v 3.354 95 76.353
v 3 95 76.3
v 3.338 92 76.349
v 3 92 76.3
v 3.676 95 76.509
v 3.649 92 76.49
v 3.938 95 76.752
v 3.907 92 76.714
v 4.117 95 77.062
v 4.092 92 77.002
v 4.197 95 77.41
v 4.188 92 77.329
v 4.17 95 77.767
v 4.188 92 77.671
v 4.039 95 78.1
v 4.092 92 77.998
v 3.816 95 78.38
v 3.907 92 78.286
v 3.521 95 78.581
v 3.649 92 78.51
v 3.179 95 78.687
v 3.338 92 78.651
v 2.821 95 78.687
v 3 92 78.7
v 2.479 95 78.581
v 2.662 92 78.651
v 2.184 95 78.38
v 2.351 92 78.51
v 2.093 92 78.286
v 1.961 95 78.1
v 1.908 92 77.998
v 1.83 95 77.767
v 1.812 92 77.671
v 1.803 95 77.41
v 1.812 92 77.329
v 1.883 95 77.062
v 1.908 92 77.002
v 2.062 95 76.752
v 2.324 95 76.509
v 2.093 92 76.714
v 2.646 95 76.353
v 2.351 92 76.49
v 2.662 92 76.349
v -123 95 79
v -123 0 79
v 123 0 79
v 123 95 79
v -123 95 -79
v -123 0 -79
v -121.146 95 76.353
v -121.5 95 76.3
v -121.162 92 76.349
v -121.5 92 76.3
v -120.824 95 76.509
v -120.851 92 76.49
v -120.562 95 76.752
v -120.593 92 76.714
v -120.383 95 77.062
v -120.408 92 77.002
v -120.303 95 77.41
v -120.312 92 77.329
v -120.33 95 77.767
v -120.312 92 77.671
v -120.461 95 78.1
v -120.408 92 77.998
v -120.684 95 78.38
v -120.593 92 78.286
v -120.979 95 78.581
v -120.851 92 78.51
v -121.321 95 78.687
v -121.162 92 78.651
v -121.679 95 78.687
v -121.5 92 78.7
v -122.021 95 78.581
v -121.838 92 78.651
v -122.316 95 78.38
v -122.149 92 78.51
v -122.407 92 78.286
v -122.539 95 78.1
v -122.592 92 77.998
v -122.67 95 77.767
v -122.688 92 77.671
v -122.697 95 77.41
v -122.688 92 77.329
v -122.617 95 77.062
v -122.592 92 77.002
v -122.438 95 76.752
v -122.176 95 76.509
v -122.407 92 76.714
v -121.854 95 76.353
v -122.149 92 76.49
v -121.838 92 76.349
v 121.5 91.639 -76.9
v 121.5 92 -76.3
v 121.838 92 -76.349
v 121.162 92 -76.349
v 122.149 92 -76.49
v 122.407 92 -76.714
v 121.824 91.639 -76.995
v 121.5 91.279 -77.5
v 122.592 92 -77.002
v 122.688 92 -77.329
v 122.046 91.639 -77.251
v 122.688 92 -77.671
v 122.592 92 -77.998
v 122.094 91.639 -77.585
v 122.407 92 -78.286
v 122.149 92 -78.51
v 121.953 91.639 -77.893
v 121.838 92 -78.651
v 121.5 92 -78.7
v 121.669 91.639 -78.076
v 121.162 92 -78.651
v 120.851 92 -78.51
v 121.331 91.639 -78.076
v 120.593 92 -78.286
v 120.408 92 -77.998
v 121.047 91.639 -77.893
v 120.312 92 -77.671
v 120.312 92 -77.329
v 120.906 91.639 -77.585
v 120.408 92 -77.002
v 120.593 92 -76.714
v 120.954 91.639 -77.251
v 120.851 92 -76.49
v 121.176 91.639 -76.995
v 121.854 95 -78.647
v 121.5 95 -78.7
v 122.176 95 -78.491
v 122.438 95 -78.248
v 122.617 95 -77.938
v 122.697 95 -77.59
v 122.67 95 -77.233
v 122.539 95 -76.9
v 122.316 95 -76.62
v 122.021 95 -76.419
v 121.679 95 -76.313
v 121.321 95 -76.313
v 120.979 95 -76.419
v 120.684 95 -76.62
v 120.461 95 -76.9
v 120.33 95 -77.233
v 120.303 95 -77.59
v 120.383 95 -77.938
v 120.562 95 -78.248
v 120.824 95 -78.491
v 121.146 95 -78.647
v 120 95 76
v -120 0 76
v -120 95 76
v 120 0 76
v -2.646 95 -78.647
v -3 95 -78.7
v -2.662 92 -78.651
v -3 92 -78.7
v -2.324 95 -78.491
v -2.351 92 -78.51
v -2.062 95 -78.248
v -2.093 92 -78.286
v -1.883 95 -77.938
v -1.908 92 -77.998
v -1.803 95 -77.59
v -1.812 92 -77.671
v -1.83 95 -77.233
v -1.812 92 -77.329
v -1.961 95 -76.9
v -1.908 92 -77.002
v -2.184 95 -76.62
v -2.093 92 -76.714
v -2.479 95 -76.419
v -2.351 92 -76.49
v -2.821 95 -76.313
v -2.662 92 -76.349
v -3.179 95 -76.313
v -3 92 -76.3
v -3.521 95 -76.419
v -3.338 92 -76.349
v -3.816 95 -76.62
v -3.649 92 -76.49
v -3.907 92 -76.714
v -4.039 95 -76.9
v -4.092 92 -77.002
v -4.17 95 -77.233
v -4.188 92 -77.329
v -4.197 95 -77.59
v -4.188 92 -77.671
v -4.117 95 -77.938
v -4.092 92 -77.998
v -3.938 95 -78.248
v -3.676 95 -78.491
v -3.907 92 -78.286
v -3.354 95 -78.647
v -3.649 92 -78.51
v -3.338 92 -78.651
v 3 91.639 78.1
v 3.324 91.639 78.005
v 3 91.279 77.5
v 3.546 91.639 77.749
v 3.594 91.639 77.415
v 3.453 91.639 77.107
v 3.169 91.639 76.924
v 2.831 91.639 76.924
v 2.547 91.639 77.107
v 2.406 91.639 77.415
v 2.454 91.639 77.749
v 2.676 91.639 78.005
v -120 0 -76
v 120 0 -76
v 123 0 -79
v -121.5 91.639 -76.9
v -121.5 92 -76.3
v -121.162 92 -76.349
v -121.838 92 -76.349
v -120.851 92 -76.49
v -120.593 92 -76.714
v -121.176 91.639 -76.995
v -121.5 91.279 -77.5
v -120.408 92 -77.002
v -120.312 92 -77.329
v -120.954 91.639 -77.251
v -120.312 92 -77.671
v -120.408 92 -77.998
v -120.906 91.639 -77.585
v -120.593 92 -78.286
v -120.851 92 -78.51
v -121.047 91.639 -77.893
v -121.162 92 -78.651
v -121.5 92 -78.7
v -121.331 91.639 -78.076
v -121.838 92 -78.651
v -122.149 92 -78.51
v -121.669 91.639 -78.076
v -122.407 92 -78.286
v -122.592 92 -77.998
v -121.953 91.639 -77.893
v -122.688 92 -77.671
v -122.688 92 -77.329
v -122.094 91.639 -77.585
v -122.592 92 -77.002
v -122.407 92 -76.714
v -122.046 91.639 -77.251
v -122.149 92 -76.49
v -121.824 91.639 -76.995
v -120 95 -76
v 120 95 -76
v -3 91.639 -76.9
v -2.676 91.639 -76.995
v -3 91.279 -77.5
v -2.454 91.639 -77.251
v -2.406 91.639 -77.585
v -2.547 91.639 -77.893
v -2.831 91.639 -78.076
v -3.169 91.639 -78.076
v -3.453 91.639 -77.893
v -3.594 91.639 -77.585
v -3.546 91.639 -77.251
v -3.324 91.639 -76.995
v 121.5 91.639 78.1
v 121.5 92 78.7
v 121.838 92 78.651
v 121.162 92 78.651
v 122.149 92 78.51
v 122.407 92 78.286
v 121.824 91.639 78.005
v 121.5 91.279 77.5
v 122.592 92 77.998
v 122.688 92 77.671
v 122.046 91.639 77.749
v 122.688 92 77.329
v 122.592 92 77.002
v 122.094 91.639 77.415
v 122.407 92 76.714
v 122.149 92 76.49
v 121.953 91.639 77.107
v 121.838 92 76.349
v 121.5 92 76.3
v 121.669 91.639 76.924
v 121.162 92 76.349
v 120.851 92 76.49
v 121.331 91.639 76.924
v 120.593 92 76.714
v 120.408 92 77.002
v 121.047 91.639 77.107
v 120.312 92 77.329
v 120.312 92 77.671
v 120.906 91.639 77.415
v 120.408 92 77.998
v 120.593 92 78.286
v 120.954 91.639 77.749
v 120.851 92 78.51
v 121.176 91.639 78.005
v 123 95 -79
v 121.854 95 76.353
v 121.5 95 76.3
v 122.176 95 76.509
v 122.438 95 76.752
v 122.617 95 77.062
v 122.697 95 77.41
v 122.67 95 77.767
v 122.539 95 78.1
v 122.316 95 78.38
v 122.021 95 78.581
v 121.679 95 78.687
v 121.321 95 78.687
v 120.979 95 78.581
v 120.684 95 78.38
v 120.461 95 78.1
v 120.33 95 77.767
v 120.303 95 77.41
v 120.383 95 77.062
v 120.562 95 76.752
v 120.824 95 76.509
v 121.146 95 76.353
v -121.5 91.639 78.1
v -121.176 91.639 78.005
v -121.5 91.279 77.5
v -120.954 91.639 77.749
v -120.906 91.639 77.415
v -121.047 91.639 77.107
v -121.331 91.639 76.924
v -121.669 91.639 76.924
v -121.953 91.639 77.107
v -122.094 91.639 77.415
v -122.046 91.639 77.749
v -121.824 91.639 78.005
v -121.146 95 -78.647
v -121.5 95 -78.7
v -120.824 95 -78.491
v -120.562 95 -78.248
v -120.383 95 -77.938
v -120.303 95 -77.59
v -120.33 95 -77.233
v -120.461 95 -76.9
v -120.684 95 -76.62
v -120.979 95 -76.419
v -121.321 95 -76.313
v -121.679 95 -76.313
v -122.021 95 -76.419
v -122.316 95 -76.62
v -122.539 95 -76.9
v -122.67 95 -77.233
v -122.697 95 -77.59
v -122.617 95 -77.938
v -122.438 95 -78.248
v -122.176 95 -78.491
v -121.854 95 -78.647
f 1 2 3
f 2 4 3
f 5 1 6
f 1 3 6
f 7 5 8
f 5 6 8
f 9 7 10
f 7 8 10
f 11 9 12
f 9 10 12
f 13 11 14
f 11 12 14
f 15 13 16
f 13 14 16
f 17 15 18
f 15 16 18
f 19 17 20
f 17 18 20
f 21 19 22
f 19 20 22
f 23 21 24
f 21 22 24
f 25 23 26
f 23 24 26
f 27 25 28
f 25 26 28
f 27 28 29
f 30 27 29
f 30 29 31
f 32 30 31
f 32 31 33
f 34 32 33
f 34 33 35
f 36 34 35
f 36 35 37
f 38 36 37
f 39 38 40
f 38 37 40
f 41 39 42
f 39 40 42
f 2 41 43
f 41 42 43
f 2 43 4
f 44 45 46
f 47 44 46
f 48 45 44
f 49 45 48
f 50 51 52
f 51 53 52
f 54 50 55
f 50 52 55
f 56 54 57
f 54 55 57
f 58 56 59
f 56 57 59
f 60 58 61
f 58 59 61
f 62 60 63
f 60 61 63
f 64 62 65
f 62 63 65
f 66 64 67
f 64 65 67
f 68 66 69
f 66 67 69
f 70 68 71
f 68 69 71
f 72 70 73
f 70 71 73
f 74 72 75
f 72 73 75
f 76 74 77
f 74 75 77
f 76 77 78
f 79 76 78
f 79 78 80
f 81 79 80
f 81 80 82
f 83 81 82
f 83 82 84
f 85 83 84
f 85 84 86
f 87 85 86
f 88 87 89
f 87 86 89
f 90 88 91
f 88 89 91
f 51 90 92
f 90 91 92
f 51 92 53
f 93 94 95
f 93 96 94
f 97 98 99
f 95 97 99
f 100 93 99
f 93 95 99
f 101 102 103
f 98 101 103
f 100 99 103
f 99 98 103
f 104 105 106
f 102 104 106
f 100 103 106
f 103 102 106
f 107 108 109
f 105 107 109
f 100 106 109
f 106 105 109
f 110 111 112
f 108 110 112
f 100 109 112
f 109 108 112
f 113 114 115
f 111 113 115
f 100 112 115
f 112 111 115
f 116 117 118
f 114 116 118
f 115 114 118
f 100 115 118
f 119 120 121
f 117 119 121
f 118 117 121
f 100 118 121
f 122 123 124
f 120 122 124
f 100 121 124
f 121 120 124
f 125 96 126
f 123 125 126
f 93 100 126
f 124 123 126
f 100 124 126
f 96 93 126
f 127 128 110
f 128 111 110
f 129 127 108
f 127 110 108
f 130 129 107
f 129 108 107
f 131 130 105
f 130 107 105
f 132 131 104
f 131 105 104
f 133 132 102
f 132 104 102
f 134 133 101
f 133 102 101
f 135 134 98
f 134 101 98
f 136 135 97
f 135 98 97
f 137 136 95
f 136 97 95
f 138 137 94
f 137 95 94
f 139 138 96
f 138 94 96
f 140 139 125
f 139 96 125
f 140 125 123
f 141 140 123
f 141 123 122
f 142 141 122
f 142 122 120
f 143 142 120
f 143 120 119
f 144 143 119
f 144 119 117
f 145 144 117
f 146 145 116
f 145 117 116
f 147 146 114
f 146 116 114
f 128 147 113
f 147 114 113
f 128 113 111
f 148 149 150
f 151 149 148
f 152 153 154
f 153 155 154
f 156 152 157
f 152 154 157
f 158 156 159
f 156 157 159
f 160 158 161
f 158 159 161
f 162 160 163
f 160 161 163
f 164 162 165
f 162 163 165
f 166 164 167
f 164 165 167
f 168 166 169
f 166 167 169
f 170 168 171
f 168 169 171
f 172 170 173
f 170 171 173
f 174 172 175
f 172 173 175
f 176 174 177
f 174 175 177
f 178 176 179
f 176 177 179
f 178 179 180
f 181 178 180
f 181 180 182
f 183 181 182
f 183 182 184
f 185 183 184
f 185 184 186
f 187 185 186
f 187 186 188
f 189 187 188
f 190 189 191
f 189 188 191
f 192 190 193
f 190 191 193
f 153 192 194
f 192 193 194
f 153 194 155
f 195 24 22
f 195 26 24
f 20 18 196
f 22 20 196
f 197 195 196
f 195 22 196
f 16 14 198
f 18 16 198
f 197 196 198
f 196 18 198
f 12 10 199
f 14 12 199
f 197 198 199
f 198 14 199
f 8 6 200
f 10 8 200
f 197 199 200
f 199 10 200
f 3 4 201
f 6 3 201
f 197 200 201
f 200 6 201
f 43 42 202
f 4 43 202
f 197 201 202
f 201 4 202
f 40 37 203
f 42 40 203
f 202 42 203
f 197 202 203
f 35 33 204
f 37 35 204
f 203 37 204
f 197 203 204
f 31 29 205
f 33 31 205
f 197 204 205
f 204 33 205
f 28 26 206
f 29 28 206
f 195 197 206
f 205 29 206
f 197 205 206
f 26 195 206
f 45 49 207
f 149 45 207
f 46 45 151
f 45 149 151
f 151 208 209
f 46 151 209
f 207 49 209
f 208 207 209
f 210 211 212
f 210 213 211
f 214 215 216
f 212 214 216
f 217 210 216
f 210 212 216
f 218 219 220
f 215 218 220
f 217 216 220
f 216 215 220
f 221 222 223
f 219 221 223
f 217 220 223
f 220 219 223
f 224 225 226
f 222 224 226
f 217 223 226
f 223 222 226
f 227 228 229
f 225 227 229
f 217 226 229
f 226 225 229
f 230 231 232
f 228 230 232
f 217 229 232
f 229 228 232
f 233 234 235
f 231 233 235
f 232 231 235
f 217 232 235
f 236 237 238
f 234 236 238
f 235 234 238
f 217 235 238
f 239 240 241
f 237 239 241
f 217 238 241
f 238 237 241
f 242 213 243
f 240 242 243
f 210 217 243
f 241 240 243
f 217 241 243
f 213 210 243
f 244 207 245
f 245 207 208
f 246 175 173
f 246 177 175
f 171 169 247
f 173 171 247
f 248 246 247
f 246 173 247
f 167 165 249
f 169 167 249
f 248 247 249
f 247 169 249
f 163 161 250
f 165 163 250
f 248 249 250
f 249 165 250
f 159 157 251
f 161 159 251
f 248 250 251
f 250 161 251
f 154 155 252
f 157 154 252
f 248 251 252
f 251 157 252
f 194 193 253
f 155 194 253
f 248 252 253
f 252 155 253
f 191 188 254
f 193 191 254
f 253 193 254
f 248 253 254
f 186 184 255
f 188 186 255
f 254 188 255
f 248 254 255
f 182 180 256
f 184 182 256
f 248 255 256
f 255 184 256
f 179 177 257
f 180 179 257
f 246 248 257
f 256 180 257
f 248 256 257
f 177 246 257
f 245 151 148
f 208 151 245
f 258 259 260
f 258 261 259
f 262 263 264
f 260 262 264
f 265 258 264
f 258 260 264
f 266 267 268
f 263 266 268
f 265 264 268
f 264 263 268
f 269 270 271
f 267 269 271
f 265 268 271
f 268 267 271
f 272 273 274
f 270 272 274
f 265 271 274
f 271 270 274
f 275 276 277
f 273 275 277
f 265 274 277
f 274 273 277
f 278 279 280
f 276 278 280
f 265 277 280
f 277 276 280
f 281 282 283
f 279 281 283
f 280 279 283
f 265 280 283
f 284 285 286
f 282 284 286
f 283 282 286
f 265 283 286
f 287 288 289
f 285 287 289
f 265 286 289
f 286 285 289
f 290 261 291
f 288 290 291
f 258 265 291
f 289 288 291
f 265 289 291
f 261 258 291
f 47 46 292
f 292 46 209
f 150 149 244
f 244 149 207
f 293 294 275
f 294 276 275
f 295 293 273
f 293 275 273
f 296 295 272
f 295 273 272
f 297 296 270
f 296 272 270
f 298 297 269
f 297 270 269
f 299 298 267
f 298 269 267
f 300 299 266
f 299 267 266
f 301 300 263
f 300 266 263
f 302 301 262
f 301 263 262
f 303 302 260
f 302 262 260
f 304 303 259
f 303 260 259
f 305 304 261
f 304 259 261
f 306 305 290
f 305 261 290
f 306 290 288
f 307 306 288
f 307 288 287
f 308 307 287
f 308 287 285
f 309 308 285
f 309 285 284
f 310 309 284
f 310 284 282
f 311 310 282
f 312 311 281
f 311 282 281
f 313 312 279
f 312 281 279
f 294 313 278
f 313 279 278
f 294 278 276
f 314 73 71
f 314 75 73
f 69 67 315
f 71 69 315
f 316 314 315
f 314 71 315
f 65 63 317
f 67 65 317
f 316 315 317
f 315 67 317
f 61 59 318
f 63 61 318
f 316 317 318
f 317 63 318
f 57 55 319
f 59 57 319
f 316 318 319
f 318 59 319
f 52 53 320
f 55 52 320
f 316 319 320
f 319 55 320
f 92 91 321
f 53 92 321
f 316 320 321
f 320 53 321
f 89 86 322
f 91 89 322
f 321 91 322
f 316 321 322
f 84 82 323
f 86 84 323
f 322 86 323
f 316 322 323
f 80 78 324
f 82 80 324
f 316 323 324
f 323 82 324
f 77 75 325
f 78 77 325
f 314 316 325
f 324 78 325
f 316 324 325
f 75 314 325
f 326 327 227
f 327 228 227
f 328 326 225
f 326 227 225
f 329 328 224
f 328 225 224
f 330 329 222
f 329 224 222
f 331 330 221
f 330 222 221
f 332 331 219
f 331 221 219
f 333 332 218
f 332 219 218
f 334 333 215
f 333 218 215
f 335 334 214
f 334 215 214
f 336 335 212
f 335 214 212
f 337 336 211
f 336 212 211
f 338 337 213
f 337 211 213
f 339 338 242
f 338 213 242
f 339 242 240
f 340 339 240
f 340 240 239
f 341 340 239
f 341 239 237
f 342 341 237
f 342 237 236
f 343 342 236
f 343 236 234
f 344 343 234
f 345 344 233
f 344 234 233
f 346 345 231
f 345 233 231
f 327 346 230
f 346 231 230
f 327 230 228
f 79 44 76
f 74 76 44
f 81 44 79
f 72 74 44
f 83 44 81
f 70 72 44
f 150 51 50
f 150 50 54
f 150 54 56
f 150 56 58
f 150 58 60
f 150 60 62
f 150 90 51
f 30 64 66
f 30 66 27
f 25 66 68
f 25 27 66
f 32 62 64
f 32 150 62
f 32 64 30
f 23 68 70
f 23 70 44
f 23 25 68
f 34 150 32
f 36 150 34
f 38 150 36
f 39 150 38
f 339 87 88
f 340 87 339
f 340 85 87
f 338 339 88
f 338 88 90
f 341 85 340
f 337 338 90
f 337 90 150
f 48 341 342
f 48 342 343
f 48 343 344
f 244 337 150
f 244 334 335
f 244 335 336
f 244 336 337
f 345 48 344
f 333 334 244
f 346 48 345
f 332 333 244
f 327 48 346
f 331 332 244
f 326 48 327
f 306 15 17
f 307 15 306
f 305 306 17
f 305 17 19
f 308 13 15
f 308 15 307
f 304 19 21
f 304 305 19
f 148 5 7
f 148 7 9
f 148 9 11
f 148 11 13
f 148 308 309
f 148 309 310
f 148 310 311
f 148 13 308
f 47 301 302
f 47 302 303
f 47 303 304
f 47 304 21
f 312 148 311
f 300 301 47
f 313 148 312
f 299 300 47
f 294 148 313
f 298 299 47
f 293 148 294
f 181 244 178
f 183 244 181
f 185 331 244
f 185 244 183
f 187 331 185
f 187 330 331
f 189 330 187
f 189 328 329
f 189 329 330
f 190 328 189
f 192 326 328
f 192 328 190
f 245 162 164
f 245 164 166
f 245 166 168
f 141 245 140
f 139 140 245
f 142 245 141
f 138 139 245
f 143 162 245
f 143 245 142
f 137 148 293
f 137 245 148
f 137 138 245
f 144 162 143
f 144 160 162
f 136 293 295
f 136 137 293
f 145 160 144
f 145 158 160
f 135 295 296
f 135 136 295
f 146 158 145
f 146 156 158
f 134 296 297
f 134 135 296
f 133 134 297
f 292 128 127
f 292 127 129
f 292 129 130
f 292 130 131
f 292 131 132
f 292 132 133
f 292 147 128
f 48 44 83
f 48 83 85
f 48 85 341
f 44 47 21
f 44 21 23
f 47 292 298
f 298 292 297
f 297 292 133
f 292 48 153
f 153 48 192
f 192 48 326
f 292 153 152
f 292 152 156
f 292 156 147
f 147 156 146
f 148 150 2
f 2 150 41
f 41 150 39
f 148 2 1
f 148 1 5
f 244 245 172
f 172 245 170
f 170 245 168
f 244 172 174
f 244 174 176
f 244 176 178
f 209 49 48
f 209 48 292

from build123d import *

# Parameters (mm, degrees)
SKETCH5_W                = 246
SKETCH5_H                = 158
SKETCH5_W_2              = 240
SKETCH5_H_2              = 152
BOSS_EXTRUDE1_DEPTH      = 95
M2_CLEARANCE_HOLE1_D     = 2.4
M2_CLEARANCE_HOLE1_DEPTH = 3
M2_CLEARANCE_HOLE1_TIP   = 0.721032743


with BuildPart() as part:
    # Sketch5 → Boss-Extrude1 (new body)
    with BuildSketch(Plane(origin=(0, 0, 0), x_dir=(1, 0, 0), z_dir=(0, 1, 0))):
        Rectangle(SKETCH5_W, SKETCH5_H)
        Rectangle(SKETCH5_W_2, SKETCH5_H_2, mode=Mode.SUBTRACT)
    extrude(amount=BOSS_EXTRUDE1_DEPTH)

    # M2 Clearance Hole1
    with Locations(Plane(origin=(-121.5, 95, -77.5), x_dir=(0, 0, 1), z_dir=(0, 1, 0))):
        with Locations((0, 0), (155, 0), (155, 243), (0, 243), (0, 118.5), (155, 124.5)):
            Hole(M2_CLEARANCE_HOLE1_D / 2, depth=M2_CLEARANCE_HOLE1_DEPTH)
            with Locations((0, 0, -(M2_CLEARANCE_HOLE1_DEPTH + M2_CLEARANCE_HOLE1_TIP / 2))):  # 118° drill point
                Cone(0, M2_CLEARANCE_HOLE1_D / 2, M2_CLEARANCE_HOLE1_TIP, mode=Mode.SUBTRACT)


solid = part.part
